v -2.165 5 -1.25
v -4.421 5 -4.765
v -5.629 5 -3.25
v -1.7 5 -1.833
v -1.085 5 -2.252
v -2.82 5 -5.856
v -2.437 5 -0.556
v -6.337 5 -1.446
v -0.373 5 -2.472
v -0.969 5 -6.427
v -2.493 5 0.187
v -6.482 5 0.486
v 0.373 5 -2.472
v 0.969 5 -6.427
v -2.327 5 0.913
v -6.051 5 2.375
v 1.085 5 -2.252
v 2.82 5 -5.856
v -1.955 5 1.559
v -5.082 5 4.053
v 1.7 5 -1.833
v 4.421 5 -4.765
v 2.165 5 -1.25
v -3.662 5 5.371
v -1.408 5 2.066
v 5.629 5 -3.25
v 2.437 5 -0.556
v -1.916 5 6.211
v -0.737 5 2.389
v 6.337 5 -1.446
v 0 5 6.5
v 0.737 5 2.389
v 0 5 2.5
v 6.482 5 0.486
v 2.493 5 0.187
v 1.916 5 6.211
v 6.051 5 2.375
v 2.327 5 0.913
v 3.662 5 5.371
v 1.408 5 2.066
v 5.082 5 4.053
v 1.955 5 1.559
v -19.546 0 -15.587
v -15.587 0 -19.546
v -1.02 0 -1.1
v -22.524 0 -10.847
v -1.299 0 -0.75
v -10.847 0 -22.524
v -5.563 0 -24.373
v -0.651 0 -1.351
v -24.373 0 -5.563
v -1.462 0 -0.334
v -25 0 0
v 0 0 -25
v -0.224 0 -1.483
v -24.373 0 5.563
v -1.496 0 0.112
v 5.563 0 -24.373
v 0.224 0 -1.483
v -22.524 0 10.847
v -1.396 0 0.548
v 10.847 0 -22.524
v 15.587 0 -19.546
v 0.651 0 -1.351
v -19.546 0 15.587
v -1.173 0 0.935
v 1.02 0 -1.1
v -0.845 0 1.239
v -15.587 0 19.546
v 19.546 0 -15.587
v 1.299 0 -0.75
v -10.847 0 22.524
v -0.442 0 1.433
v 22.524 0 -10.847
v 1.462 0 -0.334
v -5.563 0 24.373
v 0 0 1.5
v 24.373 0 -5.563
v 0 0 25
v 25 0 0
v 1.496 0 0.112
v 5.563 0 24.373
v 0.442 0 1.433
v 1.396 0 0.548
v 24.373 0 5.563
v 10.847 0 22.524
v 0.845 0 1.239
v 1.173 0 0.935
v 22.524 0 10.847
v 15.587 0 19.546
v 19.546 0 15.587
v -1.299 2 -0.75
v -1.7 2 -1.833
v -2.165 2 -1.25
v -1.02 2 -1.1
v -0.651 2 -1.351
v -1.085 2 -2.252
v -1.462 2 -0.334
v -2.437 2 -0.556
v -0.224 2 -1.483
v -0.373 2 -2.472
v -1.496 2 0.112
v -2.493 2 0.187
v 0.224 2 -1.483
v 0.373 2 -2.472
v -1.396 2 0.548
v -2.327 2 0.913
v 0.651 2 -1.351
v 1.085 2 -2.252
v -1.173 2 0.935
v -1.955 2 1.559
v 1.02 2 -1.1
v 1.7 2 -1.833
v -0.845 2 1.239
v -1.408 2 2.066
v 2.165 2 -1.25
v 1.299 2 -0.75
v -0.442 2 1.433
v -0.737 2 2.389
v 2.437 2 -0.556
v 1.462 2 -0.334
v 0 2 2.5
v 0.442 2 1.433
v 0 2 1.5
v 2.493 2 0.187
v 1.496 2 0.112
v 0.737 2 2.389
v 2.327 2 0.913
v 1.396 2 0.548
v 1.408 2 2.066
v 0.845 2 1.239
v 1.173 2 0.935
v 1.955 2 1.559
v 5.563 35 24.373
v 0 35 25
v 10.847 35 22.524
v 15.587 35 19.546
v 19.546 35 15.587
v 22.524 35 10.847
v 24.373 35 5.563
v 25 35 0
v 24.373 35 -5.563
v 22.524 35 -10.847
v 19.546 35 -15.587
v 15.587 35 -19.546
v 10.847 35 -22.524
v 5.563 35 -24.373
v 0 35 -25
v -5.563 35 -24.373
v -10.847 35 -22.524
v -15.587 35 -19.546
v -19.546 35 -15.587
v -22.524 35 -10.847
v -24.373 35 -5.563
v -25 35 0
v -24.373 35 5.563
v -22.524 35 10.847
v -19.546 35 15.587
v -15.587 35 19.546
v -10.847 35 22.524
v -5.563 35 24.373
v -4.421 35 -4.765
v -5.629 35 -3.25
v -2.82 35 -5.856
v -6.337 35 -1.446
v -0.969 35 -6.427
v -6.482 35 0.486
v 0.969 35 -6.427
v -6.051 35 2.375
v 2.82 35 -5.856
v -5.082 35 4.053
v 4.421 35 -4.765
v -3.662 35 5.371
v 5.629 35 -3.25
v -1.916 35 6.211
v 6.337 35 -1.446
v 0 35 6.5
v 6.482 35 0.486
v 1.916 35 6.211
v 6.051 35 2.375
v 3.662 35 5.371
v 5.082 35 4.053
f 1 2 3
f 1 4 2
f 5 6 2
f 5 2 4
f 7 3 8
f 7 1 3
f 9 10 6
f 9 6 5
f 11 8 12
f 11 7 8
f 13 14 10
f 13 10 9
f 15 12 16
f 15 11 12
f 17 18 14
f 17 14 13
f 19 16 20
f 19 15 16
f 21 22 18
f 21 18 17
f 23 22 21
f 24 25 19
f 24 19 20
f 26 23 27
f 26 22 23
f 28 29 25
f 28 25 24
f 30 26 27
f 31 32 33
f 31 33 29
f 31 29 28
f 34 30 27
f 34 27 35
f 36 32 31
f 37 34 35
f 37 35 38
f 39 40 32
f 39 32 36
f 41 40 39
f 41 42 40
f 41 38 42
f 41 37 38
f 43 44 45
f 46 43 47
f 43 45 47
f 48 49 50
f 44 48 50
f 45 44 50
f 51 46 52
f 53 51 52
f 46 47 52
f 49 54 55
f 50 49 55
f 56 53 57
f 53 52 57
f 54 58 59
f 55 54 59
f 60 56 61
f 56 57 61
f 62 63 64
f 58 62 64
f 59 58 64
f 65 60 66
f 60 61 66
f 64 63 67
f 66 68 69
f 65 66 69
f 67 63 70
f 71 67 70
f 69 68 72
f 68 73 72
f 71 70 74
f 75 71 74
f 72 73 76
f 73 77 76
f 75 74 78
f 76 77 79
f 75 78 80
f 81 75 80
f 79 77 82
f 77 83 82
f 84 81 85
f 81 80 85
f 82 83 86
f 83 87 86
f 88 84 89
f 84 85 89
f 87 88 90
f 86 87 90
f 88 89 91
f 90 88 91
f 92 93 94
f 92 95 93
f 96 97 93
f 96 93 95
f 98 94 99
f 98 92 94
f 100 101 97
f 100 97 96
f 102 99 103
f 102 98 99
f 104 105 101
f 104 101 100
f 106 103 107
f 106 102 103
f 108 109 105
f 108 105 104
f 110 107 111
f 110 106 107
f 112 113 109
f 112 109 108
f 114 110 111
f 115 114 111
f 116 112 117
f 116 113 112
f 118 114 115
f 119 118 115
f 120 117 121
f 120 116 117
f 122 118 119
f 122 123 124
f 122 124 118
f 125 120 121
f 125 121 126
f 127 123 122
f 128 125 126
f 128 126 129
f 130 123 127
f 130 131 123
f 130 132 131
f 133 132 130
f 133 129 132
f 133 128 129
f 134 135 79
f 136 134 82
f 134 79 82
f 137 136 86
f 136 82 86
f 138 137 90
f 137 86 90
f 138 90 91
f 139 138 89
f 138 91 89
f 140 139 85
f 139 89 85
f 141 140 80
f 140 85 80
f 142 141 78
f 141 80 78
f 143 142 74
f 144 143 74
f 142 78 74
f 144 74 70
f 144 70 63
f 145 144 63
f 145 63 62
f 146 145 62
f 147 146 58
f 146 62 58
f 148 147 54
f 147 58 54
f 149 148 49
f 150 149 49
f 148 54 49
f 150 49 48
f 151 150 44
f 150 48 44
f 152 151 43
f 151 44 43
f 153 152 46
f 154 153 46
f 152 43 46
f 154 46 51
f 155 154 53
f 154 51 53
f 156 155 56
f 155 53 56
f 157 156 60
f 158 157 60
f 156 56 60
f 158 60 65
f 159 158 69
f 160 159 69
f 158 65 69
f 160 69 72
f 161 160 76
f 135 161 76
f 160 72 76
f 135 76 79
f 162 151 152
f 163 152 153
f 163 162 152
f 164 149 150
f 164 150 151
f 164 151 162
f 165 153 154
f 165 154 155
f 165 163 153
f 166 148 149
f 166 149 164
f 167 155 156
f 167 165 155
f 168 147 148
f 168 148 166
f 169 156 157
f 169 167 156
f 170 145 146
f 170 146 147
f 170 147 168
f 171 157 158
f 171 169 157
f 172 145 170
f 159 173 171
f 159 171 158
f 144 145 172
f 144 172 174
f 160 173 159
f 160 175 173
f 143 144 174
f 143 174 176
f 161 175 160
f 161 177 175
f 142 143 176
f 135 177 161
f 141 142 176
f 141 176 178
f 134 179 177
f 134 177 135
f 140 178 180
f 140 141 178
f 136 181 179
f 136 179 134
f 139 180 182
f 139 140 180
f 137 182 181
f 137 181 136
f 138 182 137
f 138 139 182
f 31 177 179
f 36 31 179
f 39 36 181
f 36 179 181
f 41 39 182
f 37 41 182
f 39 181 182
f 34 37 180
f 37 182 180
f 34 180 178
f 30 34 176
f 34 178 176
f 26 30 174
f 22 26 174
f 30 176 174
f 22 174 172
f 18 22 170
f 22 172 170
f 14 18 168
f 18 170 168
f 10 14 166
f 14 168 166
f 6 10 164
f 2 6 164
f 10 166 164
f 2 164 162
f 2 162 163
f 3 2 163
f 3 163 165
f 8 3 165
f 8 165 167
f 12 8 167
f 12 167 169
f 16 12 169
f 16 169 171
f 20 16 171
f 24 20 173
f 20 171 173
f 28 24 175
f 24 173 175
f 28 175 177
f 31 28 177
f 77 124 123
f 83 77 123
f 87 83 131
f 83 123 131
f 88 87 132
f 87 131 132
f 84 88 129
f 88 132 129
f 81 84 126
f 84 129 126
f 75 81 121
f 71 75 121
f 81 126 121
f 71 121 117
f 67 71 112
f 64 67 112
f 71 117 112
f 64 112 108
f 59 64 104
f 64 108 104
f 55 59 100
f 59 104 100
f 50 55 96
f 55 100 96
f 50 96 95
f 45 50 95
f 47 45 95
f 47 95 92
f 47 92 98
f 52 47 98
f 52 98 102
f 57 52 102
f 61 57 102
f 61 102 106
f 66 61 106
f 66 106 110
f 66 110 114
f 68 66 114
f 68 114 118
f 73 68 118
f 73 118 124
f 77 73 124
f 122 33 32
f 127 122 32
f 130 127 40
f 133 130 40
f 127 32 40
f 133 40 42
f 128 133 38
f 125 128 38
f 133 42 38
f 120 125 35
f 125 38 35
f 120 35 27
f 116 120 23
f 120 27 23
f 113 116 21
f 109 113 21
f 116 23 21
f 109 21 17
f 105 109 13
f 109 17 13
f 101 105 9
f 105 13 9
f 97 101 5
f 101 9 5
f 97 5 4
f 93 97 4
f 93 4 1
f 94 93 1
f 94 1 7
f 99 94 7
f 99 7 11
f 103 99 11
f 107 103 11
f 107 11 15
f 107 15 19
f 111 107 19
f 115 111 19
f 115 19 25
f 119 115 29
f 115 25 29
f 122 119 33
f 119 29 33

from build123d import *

# Parameters (mm, degrees)
IZIM1_R                     = 25
Y_KSEKLIK_EKSTR_ZYON1_DEPTH = 35
IZIM2_R                     = 6.5
KES_EKSTR_ZYON1_DEPTH       = 30
IZIM3_R                     = 2.5
KES_EKSTR_ZYON2_DEPTH       = 3
IZIM4_R                     = 1.5
KES_EKSTR_ZYON3_DEPTH       = 49.363209157


with BuildPart() as part:
    # Çizim1 → Yükseklik-Ekstrüzyon1 (new body)
    with BuildSketch(Plane(origin=(0, 0, 0), x_dir=(1, 0, 0), z_dir=(0, 1, 0))):
        with Locations(Location((0, 0, 0), (0, 0, 270))):
            Circle(IZIM1_R)
    extrude(amount=Y_KSEKLIK_EKSTR_ZYON1_DEPTH)

    # Çizim2 → Kes-Ekstrüzyon1 (cut)
    with BuildSketch(Plane(origin=(0, 35, 0), x_dir=(1, 0, 0), z_dir=(0, 1, 0))):
        with Locations(Location((0, 0, 0), (0, 0, 270))):
            Circle(IZIM2_R)
    extrude(amount=-KES_EKSTR_ZYON1_DEPTH, mode=Mode.SUBTRACT)

    # Çizim3 → Kes-Ekstrüzyon2 (cut)
    with BuildSketch(Plane(origin=(0, 5, 0), x_dir=(1, 0, 0), z_dir=(0, 1, 0))):
        with Locations(Location((0, 0, 0), (0, 0, 270))):
            Circle(IZIM3_R)
    extrude(amount=-KES_EKSTR_ZYON2_DEPTH, mode=Mode.SUBTRACT)

    # Çizim4 → Kes-Ekstrüzyon3 (cut, through all)
    with BuildSketch(Plane(origin=(0, 2, 0), x_dir=(1, 0, 0), z_dir=(0, 1, 0))):
        with Locations(Location((0, 0, 0), (0, 0, 270))):
            Circle(IZIM4_R)
    extrude(amount=-KES_EKSTR_ZYON3_DEPTH, mode=Mode.SUBTRACT)


solid = part.part
